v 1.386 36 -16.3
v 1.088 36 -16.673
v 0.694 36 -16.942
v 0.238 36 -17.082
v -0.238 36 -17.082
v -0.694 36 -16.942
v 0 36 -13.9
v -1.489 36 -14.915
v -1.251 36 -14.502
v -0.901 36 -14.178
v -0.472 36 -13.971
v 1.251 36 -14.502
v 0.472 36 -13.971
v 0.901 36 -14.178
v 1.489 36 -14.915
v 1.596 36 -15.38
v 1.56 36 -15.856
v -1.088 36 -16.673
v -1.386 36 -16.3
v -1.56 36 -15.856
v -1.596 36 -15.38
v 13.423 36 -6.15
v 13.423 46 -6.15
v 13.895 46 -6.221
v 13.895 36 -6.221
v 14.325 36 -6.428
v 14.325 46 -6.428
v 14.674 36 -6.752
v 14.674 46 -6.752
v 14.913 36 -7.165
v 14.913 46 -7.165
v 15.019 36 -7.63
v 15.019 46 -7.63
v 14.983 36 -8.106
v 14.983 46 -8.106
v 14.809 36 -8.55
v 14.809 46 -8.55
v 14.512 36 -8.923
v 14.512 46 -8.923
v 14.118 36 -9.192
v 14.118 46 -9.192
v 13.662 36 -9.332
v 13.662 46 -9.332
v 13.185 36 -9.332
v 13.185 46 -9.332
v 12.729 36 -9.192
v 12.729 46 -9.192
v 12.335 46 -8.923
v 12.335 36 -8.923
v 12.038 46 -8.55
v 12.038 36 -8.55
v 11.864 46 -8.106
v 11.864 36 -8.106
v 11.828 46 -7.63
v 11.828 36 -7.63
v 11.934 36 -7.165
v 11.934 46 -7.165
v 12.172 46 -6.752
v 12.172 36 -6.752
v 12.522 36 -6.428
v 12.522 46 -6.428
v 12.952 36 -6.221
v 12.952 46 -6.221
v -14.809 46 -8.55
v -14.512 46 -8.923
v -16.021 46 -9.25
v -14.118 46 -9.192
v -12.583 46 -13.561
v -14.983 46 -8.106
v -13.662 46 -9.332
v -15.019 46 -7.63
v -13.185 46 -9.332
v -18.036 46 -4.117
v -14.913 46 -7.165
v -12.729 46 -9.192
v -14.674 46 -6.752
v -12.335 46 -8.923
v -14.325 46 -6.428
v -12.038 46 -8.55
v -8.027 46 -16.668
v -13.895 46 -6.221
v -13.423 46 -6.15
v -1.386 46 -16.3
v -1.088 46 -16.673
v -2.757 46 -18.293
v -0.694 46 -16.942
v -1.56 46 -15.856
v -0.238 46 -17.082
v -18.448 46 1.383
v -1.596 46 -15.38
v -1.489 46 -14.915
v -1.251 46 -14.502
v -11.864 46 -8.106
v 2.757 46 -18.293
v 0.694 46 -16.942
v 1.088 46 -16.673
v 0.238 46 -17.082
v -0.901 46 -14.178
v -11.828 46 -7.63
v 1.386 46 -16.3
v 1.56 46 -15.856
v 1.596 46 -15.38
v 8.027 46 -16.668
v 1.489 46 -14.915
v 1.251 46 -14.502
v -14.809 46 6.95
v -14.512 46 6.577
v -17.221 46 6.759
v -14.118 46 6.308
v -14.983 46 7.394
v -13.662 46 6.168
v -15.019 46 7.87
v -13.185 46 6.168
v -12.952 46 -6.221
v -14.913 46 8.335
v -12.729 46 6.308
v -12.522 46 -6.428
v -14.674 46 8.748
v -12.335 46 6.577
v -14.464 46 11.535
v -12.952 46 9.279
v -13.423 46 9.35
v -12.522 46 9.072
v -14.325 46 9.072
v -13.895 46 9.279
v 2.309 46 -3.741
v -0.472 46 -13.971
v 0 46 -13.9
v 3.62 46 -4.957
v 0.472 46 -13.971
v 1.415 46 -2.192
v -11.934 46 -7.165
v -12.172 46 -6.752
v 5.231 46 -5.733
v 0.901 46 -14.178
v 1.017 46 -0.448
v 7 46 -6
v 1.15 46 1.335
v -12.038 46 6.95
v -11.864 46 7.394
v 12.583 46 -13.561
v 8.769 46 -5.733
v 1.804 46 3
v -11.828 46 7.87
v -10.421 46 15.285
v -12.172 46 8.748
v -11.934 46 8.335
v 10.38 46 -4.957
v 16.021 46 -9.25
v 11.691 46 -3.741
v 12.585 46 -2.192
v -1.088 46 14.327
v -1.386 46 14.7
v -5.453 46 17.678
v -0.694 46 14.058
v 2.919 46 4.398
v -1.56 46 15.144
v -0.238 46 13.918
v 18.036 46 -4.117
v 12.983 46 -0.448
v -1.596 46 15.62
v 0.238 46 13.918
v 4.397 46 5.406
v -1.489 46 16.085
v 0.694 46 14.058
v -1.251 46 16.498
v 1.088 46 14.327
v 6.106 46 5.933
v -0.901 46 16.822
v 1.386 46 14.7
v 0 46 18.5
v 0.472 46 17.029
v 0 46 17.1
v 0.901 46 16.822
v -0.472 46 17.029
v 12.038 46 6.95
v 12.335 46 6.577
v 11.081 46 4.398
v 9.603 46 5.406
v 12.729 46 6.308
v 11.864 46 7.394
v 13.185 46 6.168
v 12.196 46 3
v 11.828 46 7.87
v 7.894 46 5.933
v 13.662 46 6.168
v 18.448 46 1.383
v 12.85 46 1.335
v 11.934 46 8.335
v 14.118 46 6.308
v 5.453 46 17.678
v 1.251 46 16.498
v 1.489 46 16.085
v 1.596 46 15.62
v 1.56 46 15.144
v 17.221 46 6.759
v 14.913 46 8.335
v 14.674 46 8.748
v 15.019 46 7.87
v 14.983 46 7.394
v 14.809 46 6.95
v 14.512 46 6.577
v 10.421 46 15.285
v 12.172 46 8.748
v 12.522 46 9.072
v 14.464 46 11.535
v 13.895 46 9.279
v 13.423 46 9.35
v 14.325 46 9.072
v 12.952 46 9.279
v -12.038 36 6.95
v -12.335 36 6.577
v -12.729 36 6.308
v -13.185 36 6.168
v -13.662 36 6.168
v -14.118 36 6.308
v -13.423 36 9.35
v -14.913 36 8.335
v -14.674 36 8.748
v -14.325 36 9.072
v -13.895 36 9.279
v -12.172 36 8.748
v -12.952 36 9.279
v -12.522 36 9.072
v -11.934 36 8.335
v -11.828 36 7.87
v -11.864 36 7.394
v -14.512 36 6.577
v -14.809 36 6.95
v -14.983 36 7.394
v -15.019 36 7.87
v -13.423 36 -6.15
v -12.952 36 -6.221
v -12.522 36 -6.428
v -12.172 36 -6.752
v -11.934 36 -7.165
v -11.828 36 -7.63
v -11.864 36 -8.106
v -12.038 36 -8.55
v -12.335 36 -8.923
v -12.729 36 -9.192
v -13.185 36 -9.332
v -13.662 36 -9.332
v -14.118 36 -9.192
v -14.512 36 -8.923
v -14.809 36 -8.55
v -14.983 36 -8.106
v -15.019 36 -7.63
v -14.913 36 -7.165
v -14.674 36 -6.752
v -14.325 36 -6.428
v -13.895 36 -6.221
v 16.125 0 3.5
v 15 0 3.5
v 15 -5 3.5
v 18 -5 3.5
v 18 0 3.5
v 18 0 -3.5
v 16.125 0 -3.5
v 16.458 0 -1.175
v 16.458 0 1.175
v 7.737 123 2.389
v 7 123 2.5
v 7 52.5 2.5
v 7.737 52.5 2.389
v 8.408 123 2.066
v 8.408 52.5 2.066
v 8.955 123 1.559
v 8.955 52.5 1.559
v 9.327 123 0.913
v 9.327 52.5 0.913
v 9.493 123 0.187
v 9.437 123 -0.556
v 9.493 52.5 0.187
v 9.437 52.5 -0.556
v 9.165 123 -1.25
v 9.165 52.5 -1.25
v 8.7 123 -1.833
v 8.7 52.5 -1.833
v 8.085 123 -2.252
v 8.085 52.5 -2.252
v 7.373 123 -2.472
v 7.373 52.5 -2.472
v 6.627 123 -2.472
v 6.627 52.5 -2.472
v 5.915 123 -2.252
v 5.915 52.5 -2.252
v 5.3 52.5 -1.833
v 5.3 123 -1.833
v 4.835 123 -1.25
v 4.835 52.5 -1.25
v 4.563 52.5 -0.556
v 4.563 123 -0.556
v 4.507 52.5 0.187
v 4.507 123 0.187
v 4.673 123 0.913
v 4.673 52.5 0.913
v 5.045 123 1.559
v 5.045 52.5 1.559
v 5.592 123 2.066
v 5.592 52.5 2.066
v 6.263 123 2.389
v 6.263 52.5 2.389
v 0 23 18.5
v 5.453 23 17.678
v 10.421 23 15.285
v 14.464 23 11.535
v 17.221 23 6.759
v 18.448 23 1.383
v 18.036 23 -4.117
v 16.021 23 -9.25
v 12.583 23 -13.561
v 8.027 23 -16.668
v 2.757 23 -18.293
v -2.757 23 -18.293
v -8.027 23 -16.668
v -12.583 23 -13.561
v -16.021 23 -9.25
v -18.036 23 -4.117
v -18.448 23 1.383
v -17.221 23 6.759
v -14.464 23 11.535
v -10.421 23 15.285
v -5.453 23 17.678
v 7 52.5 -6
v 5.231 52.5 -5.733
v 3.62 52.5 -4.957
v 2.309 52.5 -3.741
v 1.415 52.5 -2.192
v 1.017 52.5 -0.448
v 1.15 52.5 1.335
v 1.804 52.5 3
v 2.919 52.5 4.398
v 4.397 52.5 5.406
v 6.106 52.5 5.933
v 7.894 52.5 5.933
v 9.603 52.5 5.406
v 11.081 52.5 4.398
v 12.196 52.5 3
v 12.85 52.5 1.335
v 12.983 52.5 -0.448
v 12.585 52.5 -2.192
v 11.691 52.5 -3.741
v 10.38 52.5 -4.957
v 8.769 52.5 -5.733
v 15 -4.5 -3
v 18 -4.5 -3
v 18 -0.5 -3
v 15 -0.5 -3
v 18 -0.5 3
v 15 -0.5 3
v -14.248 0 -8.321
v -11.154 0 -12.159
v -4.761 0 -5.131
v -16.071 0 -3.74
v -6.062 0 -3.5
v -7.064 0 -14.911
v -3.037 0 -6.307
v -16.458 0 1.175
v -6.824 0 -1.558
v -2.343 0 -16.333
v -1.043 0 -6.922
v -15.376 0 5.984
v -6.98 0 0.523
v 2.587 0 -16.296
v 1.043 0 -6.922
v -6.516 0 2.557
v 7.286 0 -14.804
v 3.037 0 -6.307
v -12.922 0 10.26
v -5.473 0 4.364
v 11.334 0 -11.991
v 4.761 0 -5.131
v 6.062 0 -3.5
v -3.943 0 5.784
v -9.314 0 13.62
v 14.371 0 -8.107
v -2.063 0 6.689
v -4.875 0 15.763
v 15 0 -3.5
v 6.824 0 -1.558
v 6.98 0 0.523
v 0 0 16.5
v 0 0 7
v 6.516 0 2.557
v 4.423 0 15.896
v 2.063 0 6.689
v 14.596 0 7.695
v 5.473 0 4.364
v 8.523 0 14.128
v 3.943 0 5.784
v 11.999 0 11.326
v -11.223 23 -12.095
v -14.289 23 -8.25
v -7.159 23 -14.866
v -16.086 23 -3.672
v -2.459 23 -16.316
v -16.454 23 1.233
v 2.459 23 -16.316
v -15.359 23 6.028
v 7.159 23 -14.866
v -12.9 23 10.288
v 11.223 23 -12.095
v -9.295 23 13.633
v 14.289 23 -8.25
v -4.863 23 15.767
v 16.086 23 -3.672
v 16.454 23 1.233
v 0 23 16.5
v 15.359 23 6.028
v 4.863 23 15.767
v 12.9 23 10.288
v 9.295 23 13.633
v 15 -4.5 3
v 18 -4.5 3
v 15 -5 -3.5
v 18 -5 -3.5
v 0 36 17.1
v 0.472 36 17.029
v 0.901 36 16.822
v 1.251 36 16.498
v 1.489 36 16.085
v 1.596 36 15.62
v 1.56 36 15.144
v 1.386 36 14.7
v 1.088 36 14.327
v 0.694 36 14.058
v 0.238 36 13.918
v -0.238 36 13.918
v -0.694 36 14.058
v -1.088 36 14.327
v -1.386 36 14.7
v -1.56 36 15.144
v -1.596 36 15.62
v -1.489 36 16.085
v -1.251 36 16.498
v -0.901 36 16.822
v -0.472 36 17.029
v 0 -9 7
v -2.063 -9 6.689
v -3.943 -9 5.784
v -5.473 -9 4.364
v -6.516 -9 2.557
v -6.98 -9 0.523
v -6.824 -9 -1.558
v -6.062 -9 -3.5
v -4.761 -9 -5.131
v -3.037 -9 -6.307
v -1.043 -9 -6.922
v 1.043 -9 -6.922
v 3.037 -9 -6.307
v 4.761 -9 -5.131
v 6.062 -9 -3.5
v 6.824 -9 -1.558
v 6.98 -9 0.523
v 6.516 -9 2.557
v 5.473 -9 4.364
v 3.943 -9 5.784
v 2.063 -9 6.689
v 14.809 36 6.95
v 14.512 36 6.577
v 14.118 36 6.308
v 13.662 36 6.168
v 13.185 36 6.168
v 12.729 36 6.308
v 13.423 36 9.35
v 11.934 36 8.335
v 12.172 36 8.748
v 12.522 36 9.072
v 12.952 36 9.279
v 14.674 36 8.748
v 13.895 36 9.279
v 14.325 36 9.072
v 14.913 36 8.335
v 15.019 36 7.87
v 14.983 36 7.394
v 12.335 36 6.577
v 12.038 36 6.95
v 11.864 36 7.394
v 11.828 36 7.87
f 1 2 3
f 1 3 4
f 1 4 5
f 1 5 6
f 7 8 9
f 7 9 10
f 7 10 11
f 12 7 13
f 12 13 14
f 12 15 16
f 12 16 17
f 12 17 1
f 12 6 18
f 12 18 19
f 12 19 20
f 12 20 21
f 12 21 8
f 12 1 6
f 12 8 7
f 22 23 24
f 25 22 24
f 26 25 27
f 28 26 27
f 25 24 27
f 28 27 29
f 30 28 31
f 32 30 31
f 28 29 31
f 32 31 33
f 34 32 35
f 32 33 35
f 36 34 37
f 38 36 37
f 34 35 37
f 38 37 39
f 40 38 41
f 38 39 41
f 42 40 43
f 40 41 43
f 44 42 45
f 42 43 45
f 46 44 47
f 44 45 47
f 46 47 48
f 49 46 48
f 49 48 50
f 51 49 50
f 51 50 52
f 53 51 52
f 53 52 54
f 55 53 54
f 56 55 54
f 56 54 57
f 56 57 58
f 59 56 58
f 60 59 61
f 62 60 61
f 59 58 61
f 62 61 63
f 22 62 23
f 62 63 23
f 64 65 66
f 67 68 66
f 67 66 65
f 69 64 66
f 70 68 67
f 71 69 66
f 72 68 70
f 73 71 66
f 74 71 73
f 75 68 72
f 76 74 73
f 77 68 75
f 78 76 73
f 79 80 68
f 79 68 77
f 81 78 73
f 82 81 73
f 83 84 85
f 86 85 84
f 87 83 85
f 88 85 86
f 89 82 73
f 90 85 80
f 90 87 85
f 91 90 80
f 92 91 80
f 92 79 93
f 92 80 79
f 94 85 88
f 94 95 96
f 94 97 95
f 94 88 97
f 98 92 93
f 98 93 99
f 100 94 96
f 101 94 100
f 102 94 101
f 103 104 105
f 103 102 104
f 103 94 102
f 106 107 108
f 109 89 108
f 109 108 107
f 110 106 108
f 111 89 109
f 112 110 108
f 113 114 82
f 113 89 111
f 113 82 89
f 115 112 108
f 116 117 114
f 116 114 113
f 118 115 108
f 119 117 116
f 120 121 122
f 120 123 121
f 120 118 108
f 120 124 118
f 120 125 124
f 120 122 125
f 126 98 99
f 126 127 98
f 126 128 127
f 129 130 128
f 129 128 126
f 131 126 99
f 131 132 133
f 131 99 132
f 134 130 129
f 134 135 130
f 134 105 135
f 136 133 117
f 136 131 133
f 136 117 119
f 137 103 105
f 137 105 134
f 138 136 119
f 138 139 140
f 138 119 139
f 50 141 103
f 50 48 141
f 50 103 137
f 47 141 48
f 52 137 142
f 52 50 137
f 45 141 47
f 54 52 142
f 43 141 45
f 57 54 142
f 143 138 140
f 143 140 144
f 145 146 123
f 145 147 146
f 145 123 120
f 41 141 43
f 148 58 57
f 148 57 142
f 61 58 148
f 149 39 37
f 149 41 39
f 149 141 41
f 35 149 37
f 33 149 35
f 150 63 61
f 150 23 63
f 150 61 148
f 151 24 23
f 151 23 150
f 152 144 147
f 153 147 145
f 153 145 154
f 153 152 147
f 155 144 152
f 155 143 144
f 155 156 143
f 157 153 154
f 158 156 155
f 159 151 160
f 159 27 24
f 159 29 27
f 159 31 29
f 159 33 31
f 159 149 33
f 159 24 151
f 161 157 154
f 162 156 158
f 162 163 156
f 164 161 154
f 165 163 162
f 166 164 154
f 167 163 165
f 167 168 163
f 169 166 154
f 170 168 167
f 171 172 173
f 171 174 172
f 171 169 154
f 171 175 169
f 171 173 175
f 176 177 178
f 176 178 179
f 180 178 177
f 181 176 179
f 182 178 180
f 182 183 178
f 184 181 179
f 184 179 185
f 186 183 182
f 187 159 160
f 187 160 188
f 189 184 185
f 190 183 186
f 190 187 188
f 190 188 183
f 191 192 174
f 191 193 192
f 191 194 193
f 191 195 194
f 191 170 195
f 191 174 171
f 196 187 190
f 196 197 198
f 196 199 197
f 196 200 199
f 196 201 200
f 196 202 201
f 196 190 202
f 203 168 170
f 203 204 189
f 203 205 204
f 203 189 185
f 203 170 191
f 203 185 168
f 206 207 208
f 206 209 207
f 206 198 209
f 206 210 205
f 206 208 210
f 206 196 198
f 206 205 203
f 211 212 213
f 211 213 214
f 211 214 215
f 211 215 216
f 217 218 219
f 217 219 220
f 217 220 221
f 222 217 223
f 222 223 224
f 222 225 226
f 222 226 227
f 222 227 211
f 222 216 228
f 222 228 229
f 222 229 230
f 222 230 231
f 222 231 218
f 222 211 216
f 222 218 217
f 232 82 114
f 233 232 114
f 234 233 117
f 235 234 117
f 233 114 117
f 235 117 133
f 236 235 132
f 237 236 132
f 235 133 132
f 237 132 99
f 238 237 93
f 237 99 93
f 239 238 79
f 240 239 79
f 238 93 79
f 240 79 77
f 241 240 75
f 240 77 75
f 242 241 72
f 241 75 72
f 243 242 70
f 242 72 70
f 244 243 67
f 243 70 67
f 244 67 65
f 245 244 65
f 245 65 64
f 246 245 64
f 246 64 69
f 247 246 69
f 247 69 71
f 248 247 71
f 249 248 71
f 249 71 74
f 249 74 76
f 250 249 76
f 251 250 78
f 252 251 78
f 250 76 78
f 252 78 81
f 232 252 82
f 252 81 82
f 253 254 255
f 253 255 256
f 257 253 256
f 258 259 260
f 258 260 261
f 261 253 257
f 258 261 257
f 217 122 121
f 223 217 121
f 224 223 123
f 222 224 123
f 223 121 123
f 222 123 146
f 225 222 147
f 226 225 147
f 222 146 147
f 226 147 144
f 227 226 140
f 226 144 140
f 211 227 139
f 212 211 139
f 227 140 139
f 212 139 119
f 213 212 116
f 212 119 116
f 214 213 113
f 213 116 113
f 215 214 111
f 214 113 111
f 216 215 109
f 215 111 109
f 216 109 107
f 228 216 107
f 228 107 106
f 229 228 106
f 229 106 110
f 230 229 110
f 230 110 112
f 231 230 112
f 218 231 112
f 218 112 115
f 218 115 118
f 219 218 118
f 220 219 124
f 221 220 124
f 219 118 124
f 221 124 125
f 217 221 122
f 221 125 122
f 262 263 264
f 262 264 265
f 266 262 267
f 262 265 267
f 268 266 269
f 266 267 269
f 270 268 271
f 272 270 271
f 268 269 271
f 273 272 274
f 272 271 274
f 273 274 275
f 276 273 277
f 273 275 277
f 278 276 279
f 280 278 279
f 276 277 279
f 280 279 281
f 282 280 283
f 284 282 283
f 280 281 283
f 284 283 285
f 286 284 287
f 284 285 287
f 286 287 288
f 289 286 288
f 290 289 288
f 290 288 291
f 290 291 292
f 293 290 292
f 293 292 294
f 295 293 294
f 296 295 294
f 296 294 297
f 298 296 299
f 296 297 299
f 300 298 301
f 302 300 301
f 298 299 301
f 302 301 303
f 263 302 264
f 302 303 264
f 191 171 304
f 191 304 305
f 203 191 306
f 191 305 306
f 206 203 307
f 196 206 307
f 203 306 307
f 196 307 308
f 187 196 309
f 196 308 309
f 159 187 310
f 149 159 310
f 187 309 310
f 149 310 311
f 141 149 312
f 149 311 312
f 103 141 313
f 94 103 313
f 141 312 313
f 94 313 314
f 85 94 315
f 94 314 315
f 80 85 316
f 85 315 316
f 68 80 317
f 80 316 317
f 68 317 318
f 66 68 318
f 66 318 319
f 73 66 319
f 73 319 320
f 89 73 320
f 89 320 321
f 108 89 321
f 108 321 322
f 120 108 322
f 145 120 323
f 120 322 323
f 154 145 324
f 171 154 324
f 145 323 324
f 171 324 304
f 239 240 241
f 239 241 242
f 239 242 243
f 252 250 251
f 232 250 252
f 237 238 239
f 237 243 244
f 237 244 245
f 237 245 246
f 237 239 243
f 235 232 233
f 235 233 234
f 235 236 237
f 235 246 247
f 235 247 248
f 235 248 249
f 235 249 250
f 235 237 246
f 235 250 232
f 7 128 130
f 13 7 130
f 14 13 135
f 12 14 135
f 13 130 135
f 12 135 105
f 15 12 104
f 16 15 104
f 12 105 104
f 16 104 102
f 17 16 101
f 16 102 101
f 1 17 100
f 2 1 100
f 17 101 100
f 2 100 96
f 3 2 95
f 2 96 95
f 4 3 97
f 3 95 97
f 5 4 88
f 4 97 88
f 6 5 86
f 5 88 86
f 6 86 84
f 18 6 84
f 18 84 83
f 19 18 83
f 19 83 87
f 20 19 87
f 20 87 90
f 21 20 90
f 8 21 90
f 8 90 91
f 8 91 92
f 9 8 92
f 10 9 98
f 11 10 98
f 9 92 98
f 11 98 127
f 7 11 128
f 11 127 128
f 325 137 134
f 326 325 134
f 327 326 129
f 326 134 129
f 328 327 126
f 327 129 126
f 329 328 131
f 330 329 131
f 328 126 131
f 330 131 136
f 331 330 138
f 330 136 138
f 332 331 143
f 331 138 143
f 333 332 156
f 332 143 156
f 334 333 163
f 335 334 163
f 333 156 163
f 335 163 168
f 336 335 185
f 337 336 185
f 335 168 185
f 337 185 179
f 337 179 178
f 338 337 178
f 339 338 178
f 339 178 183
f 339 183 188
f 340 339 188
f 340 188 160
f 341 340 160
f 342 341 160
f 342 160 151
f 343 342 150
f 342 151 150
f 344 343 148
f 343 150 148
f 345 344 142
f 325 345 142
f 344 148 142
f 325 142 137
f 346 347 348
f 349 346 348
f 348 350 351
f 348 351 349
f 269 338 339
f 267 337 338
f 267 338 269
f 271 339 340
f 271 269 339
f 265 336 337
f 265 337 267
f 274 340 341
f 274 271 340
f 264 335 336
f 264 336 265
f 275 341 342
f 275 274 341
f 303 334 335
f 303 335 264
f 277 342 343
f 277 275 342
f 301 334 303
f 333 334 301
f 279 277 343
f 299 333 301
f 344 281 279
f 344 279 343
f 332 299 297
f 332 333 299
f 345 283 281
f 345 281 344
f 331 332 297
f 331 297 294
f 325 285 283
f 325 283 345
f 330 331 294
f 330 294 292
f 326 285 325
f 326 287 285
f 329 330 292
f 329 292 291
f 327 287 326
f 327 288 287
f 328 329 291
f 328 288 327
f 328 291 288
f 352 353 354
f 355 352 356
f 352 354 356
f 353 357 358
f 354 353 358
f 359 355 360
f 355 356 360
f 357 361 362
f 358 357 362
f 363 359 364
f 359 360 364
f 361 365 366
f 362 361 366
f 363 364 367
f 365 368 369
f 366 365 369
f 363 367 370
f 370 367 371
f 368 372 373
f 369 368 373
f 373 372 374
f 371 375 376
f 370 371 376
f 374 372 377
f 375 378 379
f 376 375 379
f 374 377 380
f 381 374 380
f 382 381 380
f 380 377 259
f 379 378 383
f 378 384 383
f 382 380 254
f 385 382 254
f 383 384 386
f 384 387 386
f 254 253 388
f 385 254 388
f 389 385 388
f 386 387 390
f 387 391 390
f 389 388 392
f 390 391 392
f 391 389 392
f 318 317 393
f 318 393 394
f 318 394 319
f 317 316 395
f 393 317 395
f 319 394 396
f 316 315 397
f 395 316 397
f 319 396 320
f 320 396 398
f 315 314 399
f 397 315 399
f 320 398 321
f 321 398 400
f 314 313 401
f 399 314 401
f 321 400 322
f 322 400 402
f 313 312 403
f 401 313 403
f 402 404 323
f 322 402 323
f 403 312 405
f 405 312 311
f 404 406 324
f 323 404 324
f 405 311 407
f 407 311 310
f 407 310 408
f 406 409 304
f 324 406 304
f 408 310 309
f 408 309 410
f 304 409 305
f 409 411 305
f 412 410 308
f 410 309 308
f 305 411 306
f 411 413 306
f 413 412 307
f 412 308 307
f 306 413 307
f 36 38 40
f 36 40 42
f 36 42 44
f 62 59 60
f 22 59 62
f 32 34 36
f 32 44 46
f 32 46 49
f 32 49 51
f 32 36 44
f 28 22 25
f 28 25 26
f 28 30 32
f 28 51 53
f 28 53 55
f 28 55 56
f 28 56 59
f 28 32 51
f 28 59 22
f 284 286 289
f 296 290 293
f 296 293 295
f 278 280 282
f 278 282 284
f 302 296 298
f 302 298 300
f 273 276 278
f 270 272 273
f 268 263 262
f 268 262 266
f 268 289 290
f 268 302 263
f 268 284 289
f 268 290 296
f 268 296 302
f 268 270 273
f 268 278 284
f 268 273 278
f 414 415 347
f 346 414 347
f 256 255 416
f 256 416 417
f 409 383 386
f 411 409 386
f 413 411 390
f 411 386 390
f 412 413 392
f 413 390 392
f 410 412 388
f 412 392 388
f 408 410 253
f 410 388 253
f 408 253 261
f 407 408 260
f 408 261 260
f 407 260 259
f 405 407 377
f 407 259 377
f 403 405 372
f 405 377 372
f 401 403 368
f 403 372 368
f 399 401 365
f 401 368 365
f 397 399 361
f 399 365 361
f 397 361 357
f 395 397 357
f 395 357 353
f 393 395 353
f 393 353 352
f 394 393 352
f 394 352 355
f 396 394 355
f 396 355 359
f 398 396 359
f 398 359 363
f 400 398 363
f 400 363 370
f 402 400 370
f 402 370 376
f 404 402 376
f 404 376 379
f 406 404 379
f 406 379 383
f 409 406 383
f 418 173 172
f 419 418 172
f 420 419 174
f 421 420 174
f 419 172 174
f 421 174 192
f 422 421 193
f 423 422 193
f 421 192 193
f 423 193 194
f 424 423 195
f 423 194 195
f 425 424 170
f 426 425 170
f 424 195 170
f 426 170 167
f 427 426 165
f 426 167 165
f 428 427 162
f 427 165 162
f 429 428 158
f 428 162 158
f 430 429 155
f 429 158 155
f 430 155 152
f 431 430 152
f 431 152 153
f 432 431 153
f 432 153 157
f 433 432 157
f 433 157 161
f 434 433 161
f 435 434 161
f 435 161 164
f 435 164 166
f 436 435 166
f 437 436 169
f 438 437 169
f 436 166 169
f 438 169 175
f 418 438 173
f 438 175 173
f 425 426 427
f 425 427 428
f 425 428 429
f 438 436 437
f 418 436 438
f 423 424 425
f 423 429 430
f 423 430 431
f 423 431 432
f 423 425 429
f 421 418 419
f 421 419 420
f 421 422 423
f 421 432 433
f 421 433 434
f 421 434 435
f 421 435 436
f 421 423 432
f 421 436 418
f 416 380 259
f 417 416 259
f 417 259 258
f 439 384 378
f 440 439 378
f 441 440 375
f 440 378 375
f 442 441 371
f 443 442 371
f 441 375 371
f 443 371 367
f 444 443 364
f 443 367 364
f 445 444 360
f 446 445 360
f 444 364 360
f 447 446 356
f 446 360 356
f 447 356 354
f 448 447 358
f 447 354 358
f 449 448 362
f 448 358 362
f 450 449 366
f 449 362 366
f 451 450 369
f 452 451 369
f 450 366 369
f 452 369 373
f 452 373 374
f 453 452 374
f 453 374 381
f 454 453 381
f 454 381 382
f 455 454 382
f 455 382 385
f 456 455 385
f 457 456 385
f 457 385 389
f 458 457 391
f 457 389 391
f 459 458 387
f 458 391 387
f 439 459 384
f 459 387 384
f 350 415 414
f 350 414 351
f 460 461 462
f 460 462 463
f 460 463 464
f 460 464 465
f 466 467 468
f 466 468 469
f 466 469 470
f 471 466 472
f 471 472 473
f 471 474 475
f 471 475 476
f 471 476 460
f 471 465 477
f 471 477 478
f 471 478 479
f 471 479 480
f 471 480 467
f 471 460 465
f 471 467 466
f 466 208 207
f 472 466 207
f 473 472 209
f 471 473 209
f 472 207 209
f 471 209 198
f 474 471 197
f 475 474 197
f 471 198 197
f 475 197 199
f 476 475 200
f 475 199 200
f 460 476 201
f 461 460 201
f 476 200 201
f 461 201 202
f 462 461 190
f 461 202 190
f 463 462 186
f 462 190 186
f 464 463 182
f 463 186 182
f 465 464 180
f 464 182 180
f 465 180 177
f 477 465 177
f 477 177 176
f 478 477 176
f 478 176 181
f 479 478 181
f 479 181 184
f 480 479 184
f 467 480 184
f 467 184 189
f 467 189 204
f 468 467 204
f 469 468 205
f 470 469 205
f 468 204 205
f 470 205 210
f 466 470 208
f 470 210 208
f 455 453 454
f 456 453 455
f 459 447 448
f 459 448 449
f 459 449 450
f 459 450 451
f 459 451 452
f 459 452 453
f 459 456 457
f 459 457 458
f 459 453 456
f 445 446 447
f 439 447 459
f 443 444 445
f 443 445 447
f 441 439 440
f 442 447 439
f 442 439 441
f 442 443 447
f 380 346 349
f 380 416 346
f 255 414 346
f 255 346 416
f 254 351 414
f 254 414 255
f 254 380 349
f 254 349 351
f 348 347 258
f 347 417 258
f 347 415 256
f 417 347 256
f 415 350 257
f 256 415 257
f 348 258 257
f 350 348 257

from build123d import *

# Parameters (mm, degrees)
SKETCH_1_R          = 16.5
EXTRUDE_1_DEPTH     = 46
SKETCH_2_R          = 7
EXTRUDE_2_DEPTH     = 9
SKETCH_3_W          = 3
SKETCH_3_H          = 7
EXTRUDE_3_DEPTH     = 5
SKETCH_4_W          = 6
SKETCH_4_H          = 4
CUT_EXTRUDE_1_DEPTH = 3
SKETCH_5_R          = 6
EXTRUDE_4_DEPTH     = 6.5
SKETCH_7_R          = 2.5
EXTRUDE_5_DEPTH     = 70.5
EXTRUDE_START       = -23
SKETCH_8_R          = 18.5
SKETCH_8_R_2        = 16.5
EXTRUDE_6_DEPTH     = 23
SKETCH_9_R          = 1.6
CUT_EXTRUDE_2_DEPTH = 10


with BuildPart() as part:
    # 草图1 → 凸台-拉伸1 (new body)
    with BuildSketch(Plane(origin=(0, 0, 0), x_dir=(1, 0, 0), z_dir=(0, 1, 0))):
        with Locations(Location((0, 0, 0), (0, 0, 270))):
            Circle(SKETCH_1_R)
    extrude(amount=EXTRUDE_1_DEPTH)

    # 草图2 → 凸台-拉伸2 (add)
    with BuildSketch(Plane.XZ):
        with Locations(Location((0, 0, 0), (0, 0, 90))):
            Circle(SKETCH_2_R)
    extrude(amount=EXTRUDE_2_DEPTH)

    # 草图3 → 凸台-拉伸3 (add)
    with BuildSketch(Plane.XZ):
        with Locations((16.5, 0)):
            Rectangle(SKETCH_3_W, SKETCH_3_H)
    extrude(amount=EXTRUDE_3_DEPTH)

    # 草图4 → 切除-拉伸1 (cut)
    with BuildSketch(Plane(origin=(18, 0, 0), x_dir=(0, 0, -1), z_dir=(1, 0, 0))):
        with Locations((0, -2.5)):
            Rectangle(SKETCH_4_W, SKETCH_4_H)
    extrude(amount=-CUT_EXTRUDE_1_DEPTH, mode=Mode.SUBTRACT)

    # 草图5 → 凸台-拉伸4 (add)
    with BuildSketch(Plane(origin=(0, 46, 0), x_dir=(1, 0, 0), z_dir=(0, 1, 0))):
        with Locations(Location((7, 0, 0), (0, 0, 90))):
            Circle(SKETCH_5_R)
    extrude(amount=EXTRUDE_4_DEPTH)

    # 草图7 → 凸台-拉伸5 (add)
    with BuildSketch(Plane(origin=(0, 52.5, 0), x_dir=(1, 0, 0), z_dir=(0, 1, 0))):
        with Locations(Location((7, 0, 0), (0, 0, 270))):
            Circle(SKETCH_7_R)
    extrude(amount=EXTRUDE_5_DEPTH)

    # 草图8 → 凸台-拉伸6 (add)
    with BuildSketch(Plane(origin=(0, 46, 0), x_dir=(1, 0, 0), z_dir=(0, 1, 0)).offset(EXTRUDE_START)):
        with Locations(Location((0, 0, 0), (0, 0, 270))):
            Circle(SKETCH_8_R)
        with Locations(Location((0, 0, 0), (0, 0, 12.246689727))):
            Circle(SKETCH_8_R_2, mode=Mode.SUBTRACT)
    extrude(amount=EXTRUDE_6_DEPTH)

    # 草图9 → 切除-拉伸2 (cut)
    with BuildSketch(Plane(origin=(0, 46, 0), x_dir=(1, 0, 0), z_dir=(0, 1, 0))):
        with Locations(Location((-13.423393759, 7.75, 0), (0, 0, 270))):
            Circle(SKETCH_9_R)
        with Locations(Location((0, 15.5, 0), (0, 0, 270))):
            Circle(SKETCH_9_R)
        with Locations(Location((13.423393759, 7.75, 0), (0, 0, 270))):
            Circle(SKETCH_9_R)
        with Locations(Location((13.423393759, -7.75, 0), (0, 0, 270))):
            Circle(SKETCH_9_R)
        with Locations(Location((0, -15.5, 0), (0, 0, 270))):
            Circle(SKETCH_9_R)
        with Locations(Location((-13.423393759, -7.75, 0), (0, 0, 270))):
            Circle(SKETCH_9_R)
    extrude(amount=-CUT_EXTRUDE_2_DEPTH, mode=Mode.SUBTRACT)


solid = part.part
